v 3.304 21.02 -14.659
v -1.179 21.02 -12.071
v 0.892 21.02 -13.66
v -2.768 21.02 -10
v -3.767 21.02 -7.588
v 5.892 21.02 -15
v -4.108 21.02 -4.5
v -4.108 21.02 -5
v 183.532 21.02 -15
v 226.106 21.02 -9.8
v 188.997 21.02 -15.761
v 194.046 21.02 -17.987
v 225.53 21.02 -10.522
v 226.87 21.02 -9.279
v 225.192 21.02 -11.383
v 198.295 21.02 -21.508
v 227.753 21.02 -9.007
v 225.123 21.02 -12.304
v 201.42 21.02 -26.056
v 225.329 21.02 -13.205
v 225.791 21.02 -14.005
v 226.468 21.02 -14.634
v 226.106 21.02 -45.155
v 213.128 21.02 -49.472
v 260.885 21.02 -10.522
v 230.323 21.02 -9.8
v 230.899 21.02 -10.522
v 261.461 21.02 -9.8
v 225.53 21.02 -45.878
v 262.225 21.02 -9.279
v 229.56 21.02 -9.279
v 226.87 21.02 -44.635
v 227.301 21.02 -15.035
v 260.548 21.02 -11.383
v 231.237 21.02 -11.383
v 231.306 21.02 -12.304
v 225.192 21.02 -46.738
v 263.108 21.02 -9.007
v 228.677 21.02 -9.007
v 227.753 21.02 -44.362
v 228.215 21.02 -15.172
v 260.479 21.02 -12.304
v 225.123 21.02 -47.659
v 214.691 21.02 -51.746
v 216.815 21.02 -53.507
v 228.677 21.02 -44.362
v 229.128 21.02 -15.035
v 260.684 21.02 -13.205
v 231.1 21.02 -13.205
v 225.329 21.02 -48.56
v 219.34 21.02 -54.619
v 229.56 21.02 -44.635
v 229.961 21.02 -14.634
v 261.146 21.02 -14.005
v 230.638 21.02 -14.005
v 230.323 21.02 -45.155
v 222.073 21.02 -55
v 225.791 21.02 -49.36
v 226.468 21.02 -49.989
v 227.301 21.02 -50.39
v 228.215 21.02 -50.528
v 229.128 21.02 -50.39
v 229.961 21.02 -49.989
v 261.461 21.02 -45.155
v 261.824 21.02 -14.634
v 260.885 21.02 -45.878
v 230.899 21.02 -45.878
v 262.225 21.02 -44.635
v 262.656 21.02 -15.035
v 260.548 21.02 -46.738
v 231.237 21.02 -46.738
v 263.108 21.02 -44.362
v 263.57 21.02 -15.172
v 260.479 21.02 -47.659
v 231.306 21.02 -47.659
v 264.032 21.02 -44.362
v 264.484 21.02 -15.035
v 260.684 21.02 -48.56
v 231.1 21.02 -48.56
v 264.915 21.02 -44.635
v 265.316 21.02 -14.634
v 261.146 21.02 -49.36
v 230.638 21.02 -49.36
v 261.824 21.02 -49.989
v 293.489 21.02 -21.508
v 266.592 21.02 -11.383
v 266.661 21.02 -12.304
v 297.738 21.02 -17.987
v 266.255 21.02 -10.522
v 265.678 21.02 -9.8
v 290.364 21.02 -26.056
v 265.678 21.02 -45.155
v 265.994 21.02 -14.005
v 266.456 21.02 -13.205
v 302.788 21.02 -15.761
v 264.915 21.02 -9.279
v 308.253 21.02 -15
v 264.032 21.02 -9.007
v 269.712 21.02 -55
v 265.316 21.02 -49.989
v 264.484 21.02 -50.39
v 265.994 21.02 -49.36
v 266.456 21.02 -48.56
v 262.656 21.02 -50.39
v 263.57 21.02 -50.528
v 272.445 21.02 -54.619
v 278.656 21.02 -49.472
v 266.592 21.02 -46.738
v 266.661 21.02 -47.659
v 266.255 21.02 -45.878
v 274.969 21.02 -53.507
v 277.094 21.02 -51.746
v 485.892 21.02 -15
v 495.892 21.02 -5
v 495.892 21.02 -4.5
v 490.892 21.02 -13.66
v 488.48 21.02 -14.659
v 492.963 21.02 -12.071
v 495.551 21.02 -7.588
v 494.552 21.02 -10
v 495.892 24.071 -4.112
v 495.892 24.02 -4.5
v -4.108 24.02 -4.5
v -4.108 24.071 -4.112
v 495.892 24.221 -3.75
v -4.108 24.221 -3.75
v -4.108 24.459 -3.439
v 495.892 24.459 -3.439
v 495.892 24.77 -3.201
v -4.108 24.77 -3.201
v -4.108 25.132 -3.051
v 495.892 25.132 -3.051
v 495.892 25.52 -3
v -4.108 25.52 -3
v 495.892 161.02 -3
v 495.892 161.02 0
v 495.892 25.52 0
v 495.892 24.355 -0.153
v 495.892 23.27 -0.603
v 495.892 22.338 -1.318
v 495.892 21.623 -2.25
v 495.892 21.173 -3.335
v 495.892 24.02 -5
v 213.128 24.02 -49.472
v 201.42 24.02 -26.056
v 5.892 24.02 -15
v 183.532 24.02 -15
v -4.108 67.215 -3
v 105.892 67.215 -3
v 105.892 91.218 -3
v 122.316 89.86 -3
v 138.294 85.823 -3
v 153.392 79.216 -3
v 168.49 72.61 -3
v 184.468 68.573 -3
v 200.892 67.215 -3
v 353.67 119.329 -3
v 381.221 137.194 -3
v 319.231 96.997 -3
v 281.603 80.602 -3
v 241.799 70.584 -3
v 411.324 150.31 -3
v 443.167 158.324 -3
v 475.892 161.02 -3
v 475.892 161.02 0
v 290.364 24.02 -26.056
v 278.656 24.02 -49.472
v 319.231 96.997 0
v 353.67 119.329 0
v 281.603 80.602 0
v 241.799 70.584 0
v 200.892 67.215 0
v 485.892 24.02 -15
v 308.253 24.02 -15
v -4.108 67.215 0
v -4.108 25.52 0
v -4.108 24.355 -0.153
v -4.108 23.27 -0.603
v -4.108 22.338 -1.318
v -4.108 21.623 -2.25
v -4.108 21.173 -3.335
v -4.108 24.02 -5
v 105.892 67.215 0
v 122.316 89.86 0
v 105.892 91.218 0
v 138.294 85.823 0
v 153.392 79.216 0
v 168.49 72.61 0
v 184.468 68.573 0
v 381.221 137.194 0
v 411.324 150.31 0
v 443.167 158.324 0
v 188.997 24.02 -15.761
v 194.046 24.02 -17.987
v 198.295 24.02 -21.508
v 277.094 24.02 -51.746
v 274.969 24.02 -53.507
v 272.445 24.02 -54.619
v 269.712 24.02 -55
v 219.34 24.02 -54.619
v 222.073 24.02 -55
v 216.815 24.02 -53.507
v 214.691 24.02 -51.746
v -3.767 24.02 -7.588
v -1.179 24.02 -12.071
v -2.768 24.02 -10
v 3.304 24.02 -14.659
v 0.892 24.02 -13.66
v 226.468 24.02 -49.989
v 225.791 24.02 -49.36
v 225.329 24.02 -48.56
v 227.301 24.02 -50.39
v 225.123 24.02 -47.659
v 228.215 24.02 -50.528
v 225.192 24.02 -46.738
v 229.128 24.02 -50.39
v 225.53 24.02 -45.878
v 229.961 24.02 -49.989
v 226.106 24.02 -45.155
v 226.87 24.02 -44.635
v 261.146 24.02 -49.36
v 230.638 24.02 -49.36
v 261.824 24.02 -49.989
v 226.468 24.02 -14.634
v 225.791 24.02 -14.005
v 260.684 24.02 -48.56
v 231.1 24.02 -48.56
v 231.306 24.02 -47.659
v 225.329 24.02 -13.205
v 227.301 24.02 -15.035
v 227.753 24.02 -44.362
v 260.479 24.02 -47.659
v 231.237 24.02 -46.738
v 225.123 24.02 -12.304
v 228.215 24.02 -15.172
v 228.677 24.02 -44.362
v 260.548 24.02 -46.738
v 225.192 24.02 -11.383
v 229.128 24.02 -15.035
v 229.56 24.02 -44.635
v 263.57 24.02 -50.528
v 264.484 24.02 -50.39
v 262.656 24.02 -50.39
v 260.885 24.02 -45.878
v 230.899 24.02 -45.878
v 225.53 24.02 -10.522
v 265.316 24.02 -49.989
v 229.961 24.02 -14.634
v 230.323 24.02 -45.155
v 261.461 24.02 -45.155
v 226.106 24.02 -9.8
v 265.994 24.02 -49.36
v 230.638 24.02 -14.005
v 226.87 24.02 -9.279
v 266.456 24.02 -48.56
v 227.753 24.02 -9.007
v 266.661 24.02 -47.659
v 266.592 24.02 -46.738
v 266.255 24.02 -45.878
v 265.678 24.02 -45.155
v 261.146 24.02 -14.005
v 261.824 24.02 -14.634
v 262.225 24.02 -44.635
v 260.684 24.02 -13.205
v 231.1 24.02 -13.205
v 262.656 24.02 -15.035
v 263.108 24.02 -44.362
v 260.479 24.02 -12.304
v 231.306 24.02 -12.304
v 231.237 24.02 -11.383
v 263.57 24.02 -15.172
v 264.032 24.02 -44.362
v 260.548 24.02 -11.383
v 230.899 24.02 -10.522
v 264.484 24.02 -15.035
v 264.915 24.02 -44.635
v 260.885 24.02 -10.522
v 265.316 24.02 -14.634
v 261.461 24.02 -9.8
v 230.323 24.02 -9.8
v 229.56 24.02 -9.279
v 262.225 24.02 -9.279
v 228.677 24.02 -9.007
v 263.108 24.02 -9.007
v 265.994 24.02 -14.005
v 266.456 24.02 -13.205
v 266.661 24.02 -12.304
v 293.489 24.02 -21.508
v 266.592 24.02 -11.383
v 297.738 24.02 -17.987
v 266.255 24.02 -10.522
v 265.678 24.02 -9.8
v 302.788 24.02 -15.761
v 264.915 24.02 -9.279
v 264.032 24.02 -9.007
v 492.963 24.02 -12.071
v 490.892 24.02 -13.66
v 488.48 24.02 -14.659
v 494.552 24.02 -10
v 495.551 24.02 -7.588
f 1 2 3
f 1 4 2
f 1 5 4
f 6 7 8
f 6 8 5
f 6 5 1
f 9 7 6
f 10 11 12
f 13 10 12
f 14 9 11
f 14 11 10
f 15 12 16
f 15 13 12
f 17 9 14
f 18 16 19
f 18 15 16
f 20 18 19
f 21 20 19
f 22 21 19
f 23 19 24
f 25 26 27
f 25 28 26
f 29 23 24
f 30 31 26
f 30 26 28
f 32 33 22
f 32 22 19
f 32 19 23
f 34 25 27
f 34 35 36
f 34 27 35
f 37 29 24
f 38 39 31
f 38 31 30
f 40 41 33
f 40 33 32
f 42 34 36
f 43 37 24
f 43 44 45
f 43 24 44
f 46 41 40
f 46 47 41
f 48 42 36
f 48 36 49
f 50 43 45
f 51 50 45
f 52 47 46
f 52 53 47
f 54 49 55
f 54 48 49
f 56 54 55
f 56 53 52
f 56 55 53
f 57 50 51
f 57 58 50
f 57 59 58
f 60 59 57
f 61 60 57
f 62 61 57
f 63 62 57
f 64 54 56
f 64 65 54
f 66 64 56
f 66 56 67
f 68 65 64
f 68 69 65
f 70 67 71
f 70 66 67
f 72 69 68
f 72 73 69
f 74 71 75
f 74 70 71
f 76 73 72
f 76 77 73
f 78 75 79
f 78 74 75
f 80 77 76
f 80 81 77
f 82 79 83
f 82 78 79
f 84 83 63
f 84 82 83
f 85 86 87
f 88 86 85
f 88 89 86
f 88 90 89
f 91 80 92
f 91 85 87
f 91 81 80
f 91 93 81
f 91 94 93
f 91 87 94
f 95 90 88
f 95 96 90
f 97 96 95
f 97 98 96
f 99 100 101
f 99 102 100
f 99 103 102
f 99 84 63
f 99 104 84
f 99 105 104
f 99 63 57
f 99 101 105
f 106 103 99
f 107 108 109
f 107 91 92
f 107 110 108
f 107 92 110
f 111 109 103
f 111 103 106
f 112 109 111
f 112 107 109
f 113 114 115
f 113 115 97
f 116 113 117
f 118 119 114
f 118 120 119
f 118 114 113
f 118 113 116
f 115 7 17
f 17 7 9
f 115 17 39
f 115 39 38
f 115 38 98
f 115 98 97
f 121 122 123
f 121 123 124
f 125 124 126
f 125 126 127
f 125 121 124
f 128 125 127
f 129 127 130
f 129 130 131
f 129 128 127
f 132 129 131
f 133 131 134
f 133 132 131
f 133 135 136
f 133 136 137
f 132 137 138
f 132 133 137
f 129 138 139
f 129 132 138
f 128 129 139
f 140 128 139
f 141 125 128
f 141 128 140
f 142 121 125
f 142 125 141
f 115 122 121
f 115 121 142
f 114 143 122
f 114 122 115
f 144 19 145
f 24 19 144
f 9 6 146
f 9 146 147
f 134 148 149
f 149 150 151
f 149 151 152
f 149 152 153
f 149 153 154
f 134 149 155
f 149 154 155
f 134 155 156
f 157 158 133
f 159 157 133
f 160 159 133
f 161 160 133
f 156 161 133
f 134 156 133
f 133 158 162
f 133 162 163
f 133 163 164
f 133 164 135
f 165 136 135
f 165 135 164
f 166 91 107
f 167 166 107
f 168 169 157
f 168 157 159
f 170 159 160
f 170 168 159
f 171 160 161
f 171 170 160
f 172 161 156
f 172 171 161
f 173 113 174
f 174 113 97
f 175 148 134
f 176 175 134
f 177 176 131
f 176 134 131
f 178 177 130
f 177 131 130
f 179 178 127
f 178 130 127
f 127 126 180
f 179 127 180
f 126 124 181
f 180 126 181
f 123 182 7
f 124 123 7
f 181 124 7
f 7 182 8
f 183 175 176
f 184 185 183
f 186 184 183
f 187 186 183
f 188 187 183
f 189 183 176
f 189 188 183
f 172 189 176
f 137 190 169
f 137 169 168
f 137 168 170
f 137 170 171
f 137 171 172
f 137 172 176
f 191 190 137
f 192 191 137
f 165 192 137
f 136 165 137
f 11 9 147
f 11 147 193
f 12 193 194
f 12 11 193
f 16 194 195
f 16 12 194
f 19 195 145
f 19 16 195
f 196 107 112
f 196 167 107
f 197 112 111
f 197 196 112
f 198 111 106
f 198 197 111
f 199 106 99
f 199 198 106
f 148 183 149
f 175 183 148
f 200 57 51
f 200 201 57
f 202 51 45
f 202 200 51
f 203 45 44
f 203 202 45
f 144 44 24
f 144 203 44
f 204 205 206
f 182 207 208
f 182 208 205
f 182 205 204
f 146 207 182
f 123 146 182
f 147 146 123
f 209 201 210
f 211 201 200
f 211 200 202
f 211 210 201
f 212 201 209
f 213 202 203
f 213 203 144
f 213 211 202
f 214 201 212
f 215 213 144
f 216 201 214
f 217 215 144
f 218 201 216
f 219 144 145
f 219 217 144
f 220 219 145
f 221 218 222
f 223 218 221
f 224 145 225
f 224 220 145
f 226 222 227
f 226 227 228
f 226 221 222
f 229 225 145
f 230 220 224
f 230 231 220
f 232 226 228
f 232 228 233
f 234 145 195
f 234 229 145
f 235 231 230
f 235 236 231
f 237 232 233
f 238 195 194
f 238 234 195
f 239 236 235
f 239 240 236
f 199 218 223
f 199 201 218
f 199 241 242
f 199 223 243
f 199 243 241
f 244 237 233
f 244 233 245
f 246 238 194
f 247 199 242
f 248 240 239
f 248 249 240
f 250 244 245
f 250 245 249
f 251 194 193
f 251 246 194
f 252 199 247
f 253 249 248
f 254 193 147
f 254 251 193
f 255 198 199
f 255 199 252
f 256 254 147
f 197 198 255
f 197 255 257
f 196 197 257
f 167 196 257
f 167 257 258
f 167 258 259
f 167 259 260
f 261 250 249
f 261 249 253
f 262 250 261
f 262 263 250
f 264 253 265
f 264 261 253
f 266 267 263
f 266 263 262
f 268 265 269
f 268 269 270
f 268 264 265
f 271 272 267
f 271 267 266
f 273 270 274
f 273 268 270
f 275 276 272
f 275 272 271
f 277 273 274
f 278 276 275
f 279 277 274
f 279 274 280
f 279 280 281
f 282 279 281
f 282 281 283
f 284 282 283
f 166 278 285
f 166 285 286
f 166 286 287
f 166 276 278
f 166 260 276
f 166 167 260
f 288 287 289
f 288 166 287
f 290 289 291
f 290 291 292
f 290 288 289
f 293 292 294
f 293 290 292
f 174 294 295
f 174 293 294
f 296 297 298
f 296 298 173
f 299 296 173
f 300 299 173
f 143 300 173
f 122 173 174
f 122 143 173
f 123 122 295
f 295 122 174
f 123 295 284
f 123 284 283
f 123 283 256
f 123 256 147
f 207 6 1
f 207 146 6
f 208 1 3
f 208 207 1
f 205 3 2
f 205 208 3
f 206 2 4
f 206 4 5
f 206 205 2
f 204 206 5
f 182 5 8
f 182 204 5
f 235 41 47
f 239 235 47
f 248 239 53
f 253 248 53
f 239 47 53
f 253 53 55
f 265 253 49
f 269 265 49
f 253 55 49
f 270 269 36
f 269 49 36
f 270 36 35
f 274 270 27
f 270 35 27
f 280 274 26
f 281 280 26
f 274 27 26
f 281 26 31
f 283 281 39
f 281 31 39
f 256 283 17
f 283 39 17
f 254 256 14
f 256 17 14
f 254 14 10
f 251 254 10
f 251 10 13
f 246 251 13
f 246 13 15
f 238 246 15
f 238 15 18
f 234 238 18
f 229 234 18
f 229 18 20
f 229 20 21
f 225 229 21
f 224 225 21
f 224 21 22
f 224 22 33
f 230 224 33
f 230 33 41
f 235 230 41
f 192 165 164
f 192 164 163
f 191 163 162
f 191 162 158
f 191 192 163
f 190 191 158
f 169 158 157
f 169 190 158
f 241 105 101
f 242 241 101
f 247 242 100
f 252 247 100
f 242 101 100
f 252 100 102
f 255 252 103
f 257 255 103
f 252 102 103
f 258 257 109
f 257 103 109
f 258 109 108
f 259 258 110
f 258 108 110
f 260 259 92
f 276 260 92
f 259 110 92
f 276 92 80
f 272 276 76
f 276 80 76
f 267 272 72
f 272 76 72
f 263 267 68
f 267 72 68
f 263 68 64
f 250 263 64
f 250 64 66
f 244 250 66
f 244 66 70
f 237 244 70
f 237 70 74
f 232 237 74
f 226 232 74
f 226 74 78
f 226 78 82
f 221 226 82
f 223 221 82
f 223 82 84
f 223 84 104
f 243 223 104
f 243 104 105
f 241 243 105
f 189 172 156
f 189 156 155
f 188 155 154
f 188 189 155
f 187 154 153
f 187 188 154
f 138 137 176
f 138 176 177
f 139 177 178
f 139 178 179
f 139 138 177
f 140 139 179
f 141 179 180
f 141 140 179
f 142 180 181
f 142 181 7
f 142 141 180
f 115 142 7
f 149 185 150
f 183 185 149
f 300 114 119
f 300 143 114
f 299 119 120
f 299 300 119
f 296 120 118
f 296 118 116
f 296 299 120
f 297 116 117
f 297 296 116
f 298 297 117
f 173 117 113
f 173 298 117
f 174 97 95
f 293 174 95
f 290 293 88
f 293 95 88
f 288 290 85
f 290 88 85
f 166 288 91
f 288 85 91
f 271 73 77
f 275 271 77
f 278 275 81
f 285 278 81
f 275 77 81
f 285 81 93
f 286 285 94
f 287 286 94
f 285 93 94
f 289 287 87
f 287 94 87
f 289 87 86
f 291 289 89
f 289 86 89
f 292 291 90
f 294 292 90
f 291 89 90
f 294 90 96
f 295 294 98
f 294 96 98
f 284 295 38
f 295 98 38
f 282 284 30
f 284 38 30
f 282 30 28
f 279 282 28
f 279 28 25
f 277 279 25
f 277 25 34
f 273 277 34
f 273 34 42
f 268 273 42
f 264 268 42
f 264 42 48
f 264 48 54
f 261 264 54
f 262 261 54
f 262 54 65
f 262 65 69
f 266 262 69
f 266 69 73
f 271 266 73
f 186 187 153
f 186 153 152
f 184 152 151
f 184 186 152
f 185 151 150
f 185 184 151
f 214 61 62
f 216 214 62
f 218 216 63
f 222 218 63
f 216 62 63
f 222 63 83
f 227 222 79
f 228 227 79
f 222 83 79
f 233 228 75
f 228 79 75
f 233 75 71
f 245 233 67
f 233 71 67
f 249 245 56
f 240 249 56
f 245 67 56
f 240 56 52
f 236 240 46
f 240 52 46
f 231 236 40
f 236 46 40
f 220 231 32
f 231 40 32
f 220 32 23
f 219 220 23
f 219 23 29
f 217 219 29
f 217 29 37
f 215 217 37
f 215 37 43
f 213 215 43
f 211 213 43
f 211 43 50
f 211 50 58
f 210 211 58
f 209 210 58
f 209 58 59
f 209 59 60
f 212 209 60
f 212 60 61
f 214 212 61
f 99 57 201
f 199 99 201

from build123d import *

# Parameters (mm, degrees)
BASIS_BLECH1_DEPTH              = 3
KANTE_LASCHE1_STRIP_W           = 15
KANTE_LASCHE1_STRIP_H           = 3
KANTE_LASCHE1_STRIP_CUT_DEPTH   = 500
KANTE_LASCHE1_DEPTH             = 500
SKIZZE19_R                      = 3.1
SCHNITT_LINEAR_AUSTRAGEN2_DEPTH = 519.20277279
SCHNITT_LINEAR_AUSTRAGEN3_DEPTH = 519.20277279
VERRUNDUNG1_R                   = 10


# Sheet-metal steps are written as plain solids
with BuildPart() as part:
    # Skizze9 → Basis-Blech1 (new body)
    with BuildSketch(Plane.XY):
        with BuildLine():
            Line((-4.107759965, 21.019858626), (495.892240035, 21.019858626))
            Line((495.892240035, 21.019858626), (495.892240035, 161.019858626))
            Line((495.892240035, 161.019858626), (475.892240035, 161.019858626))
            ThreePointArc((475.892240035, 161.019858626), (411.323644717, 150.310366837), (353.670017813, 119.328823613))
            ThreePointArc((353.670017813, 119.328823613), (281.602984183, 80.601894582), (200.892240035, 67.215029846))
            ThreePointArc((200.892240035, 67.215029846), (176.395892893, 70.261798973), (153.392240035, 79.216450312))
            ThreePointArc((153.392240035, 79.216450312), (130.388587177, 88.171101651), (105.892240035, 91.217870778))
            Line((105.892240035, 91.217870778), (105.892240035, 67.215029846))
            Line((105.892240035, 67.215029846), (-4.107759965, 67.215029846))
            Line((-4.107759965, 67.215029846), (-4.107759965, 21.019858626))
        make_face()
    extrude(amount=-BASIS_BLECH1_DEPTH)

    # Kante-Lasche1 strip (across the edge) → Kante-Lasche1 strip cut (cut)
    with BuildSketch(Plane(origin=(495.892240035, 21.019858626, -3), x_dir=(0, 1, 0), z_dir=(-1, 0, 0))):
        with Locations((-3, -1.5)):
            Rectangle(KANTE_LASCHE1_STRIP_W, KANTE_LASCHE1_STRIP_H)
    extrude(amount=KANTE_LASCHE1_STRIP_CUT_DEPTH, mode=Mode.SUBTRACT)

    # Kante-Lasche1 section (across the edge) → Kante-Lasche1 (add)
    with BuildSketch(Plane(origin=(495.892240035, 21.019858626, -3), x_dir=(0, 1, 0), z_dir=(-1, 0, 0))):
        with BuildLine():
            Line((0, 1.5), (0, 52))
            Line((0, 52), (3, 52))
            Line((3, 52), (3, 1.5))
            ThreePointArc((3, 1.5), (3.439339828, 0.439339828), (4.5, 0))
            Line((4.5, 0), (4.5, -3))
            ThreePointArc((4.5, -3), (1.318019485, -1.681980515), (0, 1.5))
        make_face()
    extrude(amount=KANTE_LASCHE1_DEPTH)

    # Skizze19 → Schnitt-Linear austragen2 (cut, through all)
    with BuildSketch(Plane.XZ.offset(-21.019858626)):
        with Locations(Location((263.569909565, -12.07233047, 0), (0, 0, 270))):
            Circle(SKIZZE19_R)
        with Locations(Location((228.214570506, -12.07233047, 0), (0, 0, 270))):
            Circle(SKIZZE19_R)
        with Locations(Location((263.569909565, -47.42766953, 0), (0, 0, 270))):
            Circle(SKIZZE19_R)
        with Locations(Location((228.214570506, -47.42766953, 0), (0, 0, 270))):
            Circle(SKIZZE19_R)
    extrude(amount=-SCHNITT_LINEAR_AUSTRAGEN2_DEPTH, mode=Mode.SUBTRACT)

    # Skizze21 → Schnitt-Linear austragen3 (cut, through all)
    with BuildSketch(Plane.XZ.offset(-21.019858626)):
        with BuildLine():
            Line((-4.107759965, -55), (-4.107759965, -15))
            Line((-4.107759965, -15), (183.53156026, -15))
            ThreePointArc((183.53156026, -15), (194.046182503, -17.986983833), (201.42010408, -26.05572809))
            Line((201.42010408, -26.05572809), (215.892240035, -55))
            Line((215.892240035, -55), (-4.107759965, -55))
        make_face()
        with BuildLine():
            Line((275.892240035, -55), (495.892240035, -55))
            Line((495.892240035, -55), (495.892240035, -15))
            Line((495.892240035, -15), (308.25291981, -15))
            ThreePointArc((308.25291981, -15), (297.738297568, -17.986983833), (290.36437599, -26.05572809))
            Line((290.36437599, -26.05572809), (275.892240035, -55))
        make_face()
    extrude(amount=-SCHNITT_LINEAR_AUSTRAGEN3_DEPTH, mode=Mode.SUBTRACT)

    # Verrundung1
    verrundung1_edges = [part.edges().sort_by_distance(p)[0] for p in [
        (275.892240035, 22.519858626, -55),
        (215.892240035, 22.519858626, -55),
        (-4.107759965, 22.519858626, -15),
        (495.892240035, 22.519858626, -15),
    ]]
    fillet(verrundung1_edges, radius=VERRUNDUNG1_R)


solid = part.part
